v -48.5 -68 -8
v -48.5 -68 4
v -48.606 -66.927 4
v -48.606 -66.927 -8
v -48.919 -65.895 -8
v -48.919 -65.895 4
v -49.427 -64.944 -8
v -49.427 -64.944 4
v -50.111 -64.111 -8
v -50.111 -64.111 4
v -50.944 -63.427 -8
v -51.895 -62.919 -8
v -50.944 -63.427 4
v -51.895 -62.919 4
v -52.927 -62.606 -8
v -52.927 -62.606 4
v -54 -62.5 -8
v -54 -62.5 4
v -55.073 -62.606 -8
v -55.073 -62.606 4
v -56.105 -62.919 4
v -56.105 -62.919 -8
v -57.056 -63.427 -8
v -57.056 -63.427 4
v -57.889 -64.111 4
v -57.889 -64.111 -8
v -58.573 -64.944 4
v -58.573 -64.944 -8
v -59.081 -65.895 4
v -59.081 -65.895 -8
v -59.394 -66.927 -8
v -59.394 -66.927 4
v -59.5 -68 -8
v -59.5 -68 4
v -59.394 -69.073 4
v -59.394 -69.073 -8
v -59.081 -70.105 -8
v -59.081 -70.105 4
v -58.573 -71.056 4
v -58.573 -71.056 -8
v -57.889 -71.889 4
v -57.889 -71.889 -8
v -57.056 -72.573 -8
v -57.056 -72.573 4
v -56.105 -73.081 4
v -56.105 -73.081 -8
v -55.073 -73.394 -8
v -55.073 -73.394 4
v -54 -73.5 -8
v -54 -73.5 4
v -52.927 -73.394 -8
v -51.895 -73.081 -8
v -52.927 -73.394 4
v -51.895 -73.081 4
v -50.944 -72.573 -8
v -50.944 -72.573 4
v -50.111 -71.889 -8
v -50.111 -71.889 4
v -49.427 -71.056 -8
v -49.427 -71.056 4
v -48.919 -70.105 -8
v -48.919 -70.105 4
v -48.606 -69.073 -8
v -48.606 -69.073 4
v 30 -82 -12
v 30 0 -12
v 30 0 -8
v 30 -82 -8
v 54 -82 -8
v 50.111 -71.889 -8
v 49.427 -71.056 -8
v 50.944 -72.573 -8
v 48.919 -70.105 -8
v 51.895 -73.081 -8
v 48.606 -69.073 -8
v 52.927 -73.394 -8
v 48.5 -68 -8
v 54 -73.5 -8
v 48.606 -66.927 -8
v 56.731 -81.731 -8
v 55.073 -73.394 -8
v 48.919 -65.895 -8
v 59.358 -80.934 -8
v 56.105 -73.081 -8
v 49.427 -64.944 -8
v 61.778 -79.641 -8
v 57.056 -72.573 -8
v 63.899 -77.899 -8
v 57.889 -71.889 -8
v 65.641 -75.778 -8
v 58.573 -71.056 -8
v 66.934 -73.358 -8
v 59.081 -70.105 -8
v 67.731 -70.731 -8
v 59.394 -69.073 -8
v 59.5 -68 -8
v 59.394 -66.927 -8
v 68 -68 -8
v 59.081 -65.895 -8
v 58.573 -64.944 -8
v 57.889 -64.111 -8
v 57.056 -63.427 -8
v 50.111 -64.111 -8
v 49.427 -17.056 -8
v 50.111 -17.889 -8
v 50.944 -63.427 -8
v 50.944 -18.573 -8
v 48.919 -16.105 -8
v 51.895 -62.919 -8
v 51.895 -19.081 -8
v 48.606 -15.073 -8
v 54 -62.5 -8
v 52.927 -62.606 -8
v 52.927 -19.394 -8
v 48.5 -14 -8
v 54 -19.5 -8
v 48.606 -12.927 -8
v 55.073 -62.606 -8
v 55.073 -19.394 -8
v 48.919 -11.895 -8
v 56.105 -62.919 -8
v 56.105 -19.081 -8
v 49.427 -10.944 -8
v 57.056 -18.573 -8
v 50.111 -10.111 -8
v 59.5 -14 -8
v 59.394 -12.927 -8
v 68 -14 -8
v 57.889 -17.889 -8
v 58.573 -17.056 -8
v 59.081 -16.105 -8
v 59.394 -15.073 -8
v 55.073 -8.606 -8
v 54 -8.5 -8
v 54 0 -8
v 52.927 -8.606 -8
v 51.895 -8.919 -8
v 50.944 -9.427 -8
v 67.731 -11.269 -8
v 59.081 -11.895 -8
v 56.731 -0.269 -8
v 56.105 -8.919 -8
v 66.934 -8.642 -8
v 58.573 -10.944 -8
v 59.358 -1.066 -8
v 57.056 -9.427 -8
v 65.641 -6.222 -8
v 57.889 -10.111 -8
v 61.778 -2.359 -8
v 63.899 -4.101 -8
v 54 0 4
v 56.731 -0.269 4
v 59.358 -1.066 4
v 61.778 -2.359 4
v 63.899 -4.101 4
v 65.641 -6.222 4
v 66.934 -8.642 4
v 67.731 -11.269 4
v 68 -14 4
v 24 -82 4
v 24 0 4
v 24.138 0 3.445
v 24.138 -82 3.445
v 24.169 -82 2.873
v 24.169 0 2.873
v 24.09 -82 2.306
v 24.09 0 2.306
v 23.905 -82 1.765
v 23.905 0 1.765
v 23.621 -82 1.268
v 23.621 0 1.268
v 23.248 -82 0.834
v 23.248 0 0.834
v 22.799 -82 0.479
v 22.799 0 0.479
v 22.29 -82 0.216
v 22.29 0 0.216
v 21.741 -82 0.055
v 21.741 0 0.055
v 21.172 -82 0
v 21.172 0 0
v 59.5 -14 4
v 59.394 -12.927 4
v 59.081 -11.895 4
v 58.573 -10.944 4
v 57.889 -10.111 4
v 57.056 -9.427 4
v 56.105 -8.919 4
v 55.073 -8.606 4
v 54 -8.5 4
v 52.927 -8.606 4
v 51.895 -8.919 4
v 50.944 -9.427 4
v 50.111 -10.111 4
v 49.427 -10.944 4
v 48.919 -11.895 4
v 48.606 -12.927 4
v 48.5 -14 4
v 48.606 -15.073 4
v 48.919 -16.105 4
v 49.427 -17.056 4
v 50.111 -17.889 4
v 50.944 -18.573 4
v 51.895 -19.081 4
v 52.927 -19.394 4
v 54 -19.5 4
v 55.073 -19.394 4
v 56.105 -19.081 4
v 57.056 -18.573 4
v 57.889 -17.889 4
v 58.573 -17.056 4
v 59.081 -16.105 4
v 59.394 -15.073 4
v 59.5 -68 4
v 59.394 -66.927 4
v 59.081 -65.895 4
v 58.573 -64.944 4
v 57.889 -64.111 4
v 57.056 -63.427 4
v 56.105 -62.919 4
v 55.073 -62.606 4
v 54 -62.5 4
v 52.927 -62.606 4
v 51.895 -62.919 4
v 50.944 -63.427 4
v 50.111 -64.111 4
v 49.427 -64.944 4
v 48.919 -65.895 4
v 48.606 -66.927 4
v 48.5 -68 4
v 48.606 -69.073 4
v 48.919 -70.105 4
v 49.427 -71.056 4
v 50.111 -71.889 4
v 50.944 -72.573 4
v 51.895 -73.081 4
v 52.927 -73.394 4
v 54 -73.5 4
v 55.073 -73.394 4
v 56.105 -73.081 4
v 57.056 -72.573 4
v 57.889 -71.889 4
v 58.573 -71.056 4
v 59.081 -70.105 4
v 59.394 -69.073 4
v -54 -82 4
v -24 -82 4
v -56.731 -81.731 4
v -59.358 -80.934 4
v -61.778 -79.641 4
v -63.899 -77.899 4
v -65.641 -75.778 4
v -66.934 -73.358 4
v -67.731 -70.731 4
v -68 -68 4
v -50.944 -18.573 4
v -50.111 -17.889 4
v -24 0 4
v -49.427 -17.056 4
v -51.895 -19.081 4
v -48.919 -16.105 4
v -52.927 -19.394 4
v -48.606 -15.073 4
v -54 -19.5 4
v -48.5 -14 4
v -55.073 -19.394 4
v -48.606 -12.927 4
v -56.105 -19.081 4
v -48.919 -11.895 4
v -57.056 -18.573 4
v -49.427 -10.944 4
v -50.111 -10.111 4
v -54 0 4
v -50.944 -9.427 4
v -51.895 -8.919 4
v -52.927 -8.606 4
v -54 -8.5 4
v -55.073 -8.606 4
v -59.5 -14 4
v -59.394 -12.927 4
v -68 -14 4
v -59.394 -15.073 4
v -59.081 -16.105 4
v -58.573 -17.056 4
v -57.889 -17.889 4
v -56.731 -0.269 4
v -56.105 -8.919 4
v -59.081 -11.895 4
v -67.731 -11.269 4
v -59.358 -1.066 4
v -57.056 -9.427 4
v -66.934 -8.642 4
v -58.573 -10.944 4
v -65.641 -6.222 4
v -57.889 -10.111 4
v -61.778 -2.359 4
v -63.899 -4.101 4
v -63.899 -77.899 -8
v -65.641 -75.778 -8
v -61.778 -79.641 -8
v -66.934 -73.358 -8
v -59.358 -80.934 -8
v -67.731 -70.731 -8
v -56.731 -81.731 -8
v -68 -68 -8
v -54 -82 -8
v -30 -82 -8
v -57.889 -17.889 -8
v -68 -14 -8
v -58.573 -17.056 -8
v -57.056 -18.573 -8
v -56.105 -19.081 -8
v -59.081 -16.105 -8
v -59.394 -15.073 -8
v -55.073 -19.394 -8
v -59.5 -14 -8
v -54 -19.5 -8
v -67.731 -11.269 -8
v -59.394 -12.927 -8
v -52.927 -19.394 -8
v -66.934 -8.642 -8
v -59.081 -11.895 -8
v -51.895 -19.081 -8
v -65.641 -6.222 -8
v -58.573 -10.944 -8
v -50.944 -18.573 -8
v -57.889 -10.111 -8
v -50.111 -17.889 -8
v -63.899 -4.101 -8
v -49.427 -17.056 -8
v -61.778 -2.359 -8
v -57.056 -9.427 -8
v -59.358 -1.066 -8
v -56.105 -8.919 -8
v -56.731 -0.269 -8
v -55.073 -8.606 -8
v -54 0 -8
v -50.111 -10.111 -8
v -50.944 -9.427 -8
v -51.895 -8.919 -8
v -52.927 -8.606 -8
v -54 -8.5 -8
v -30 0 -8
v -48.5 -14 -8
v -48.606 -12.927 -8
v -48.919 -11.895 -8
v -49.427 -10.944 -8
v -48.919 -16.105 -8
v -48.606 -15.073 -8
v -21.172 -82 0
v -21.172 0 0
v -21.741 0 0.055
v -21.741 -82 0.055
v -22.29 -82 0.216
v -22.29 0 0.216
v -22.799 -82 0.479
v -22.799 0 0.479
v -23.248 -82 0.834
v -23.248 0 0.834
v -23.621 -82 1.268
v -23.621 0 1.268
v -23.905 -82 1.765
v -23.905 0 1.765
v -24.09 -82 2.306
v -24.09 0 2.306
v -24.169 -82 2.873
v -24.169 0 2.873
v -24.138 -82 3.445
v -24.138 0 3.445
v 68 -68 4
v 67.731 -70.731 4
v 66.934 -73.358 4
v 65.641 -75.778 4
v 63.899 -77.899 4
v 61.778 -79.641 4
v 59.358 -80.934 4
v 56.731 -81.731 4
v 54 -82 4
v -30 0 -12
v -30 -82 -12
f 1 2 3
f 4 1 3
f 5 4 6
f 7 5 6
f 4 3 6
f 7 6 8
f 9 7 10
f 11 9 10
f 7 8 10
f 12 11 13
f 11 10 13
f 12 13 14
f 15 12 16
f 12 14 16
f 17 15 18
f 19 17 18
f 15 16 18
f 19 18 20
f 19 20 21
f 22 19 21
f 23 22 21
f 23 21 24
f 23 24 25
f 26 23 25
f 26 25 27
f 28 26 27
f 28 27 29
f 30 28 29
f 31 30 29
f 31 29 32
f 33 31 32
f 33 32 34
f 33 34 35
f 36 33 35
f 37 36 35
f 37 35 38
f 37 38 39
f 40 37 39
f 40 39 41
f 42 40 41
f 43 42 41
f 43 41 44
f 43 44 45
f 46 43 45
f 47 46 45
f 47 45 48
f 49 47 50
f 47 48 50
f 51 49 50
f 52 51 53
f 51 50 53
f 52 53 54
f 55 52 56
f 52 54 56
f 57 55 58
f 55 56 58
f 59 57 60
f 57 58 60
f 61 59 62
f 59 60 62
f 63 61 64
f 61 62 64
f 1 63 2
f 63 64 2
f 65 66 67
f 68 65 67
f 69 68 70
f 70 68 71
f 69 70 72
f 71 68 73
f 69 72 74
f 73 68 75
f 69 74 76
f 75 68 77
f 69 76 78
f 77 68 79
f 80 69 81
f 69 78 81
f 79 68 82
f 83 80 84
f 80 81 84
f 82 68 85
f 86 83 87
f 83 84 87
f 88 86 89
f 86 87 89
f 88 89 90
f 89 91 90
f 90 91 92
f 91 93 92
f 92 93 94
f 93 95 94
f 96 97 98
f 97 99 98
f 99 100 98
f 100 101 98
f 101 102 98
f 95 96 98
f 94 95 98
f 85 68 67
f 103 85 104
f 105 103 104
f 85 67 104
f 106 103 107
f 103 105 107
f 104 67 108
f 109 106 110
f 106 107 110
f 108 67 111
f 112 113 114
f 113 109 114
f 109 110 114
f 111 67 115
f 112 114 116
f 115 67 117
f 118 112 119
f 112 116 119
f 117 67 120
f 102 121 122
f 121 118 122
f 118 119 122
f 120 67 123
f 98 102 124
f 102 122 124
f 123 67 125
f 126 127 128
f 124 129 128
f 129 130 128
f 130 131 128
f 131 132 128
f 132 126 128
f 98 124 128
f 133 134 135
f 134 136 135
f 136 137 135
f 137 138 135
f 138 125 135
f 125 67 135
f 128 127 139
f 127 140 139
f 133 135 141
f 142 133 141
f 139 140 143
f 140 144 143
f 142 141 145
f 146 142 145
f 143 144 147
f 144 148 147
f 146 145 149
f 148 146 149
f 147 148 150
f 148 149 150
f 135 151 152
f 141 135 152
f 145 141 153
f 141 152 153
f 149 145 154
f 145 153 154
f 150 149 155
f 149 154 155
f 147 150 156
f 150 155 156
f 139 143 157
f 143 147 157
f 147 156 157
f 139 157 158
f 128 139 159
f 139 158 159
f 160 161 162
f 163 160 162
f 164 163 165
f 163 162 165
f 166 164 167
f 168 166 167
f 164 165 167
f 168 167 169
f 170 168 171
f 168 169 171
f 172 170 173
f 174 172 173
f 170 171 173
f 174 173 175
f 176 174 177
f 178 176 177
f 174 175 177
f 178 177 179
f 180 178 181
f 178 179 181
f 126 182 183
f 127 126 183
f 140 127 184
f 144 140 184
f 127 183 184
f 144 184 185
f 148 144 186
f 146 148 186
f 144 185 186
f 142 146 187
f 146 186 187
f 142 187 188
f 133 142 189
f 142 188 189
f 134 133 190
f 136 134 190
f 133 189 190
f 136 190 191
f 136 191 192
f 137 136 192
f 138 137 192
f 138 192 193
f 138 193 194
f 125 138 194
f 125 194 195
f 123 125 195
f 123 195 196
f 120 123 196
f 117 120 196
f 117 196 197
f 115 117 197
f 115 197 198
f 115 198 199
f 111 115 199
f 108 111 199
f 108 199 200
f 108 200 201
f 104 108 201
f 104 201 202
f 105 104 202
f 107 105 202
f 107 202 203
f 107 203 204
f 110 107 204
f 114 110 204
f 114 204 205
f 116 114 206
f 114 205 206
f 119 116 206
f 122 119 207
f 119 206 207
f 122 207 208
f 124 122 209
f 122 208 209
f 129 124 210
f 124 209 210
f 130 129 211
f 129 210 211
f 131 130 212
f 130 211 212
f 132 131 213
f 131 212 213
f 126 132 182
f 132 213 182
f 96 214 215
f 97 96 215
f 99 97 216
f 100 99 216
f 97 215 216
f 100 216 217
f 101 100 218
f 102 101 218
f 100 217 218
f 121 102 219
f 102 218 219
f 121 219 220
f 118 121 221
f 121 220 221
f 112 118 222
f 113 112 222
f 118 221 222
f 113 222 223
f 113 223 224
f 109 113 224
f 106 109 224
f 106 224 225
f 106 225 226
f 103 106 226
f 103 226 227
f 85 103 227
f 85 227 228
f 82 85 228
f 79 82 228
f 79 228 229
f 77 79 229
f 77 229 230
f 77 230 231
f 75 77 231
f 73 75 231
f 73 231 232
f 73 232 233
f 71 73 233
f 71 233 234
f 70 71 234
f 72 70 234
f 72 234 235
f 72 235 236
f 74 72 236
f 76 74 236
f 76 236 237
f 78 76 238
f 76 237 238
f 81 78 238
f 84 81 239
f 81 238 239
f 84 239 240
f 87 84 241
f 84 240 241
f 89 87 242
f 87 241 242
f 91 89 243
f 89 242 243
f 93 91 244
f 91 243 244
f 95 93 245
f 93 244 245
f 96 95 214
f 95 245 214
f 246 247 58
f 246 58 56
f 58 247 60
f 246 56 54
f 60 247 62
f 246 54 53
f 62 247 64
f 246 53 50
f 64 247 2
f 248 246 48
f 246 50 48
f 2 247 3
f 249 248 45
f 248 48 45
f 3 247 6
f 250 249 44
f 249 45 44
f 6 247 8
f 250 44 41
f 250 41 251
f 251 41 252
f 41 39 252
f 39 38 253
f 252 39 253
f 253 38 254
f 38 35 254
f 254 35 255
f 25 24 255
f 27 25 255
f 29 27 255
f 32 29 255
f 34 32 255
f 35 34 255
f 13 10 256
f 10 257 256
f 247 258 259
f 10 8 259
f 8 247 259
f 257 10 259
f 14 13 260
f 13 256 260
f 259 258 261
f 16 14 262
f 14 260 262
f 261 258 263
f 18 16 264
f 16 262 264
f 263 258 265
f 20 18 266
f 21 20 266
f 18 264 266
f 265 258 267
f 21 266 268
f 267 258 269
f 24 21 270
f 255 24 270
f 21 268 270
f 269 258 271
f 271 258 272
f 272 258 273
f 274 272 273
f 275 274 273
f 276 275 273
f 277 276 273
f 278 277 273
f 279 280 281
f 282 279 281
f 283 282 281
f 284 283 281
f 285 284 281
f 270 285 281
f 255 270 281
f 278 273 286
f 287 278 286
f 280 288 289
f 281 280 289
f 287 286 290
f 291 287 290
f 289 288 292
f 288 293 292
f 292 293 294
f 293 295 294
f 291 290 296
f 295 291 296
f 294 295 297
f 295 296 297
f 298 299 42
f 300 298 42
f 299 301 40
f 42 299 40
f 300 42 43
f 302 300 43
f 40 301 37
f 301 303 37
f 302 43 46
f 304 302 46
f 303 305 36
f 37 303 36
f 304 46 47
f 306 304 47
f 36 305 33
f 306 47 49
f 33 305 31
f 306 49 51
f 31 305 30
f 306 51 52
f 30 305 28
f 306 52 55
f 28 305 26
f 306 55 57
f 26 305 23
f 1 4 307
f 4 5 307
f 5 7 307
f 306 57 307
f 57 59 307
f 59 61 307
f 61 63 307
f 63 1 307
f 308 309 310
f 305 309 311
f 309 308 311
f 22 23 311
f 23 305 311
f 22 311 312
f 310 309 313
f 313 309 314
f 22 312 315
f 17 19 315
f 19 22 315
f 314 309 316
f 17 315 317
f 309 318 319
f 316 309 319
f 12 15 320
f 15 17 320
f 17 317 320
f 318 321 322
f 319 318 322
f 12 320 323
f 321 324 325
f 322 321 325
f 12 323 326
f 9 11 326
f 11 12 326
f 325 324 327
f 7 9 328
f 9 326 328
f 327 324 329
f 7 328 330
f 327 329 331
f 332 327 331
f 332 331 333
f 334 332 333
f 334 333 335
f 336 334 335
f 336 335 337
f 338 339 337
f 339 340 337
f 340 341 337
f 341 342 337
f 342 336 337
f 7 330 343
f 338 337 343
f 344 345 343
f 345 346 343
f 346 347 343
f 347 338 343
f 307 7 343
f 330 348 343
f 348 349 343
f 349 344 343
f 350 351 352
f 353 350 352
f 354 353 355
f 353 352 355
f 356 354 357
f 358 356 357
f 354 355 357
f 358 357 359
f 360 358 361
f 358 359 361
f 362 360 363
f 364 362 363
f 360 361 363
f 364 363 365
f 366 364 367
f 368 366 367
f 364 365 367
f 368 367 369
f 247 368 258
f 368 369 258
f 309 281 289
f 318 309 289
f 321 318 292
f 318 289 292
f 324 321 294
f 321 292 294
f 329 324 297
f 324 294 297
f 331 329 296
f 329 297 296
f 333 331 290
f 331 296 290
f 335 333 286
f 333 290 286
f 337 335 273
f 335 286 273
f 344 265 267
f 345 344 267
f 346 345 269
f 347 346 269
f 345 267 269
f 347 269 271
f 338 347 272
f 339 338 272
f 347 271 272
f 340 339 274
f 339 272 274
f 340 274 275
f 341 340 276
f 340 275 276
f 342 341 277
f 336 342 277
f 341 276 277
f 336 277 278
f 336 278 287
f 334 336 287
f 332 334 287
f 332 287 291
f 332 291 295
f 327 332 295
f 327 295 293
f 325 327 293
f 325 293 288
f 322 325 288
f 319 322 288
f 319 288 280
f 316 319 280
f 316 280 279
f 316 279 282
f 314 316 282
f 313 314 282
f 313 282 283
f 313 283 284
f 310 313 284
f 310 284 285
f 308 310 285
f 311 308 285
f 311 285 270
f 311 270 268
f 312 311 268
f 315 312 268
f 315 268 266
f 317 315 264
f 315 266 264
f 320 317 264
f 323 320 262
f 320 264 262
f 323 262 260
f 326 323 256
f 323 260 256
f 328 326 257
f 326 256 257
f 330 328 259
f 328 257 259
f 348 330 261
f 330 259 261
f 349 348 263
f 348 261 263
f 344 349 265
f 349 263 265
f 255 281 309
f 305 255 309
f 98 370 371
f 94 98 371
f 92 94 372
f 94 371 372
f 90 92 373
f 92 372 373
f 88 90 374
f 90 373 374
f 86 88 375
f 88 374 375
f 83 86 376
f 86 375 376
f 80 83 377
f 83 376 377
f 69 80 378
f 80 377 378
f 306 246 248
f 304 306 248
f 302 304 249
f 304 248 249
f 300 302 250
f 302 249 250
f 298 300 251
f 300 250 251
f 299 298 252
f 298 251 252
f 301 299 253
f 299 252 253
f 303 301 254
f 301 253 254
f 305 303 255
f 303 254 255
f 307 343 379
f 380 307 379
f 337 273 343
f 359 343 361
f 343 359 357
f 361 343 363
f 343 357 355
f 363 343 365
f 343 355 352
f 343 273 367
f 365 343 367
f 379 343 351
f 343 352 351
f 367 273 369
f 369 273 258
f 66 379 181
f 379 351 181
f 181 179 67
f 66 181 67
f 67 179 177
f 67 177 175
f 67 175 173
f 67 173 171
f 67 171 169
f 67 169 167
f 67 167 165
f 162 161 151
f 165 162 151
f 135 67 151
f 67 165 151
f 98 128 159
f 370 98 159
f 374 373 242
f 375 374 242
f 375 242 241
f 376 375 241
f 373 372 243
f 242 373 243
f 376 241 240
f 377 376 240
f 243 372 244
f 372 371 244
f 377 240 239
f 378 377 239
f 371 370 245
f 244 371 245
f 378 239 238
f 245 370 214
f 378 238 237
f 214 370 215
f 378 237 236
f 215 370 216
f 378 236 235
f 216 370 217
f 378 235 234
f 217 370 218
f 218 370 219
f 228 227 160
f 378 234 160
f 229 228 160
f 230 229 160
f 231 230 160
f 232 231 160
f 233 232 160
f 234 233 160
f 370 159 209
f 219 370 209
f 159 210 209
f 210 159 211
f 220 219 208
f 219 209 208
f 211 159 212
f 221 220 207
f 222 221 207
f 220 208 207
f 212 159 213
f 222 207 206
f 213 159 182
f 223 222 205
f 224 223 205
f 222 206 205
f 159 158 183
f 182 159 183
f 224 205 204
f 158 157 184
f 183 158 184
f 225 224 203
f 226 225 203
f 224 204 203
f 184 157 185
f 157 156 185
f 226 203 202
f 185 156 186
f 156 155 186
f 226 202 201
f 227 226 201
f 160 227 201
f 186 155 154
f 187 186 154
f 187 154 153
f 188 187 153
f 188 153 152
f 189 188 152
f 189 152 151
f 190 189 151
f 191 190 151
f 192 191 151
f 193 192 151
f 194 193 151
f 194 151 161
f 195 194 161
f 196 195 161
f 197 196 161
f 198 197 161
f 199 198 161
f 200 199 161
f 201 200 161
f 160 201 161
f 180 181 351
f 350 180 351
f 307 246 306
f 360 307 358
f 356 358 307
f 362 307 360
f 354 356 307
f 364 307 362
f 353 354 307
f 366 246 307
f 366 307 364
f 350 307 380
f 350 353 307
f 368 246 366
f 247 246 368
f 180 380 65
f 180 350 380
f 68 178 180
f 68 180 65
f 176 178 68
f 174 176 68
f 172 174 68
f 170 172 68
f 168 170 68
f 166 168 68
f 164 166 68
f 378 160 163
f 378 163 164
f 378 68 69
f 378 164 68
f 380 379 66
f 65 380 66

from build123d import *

# Parameters (mm, degrees)
F1_DEPTH = 82
F3_DEPTH = 25
F4_R     = 5.5
F5_DEPTH = 25


with BuildPart() as f1:
    # F0 (on Front) → F1 (new body)
    with BuildSketch(Plane.XZ):
        with BuildLine():
            Line((21.171573, 0), (0, 0))
            Line((0, 0), (-21.171573, 0))
            ThreePointArc((-21.171573, 0), (-23.621063, 1.267949), (-24, 4))
            Line((-24, 4), (-68, 4))
            Line((-68, 4), (-68, -8))
            Line((-68, -8), (-30, -8))
            Line((-30, -8), (-30, -12))
            Line((-30, -12), (0, -12))
            Line((0, -12), (30, -12))
            Line((30, -12), (30, -8))
            Line((30, -8), (68, -8))
            Line((68, -8), (68, 4))
            Line((68, 4), (24, 4))
            ThreePointArc((24, 4), (23.621063, 1.267949), (21.171573, 0))
        make_face()
    extrude(amount=F1_DEPTH)

    # F2 (on face) → F3 (cut)
    with BuildSketch(Plane.XY.offset(4)):
        with BuildLine():
            ThreePointArc((-68, -14), (-63.899495, -4.100505), (-54, 0))
            Line((-54, 0), (-68, 0))
            Line((-68, 0), (-68, -14))
        make_face()
        with BuildLine():
            Line((-68, -82), (-54, -82))
            ThreePointArc((-54, -82), (-63.899495, -77.899495), (-68, -68))
            Line((-68, -68), (-68, -82))
        make_face()
        with BuildLine():
            Line((68, 0), (54, 0))
            ThreePointArc((54, 0), (63.899495, -4.100505), (68, -14))
            Line((68, -14), (68, 0))
        make_face()
        with BuildLine():
            ThreePointArc((68, -68), (63.899495, -77.899495), (54, -82))
            Line((54, -82), (68, -82))
            Line((68, -82), (68, -68))
        make_face()
    extrude(amount=-F3_DEPTH, mode=Mode.SUBTRACT)

    # F4 (on face) → F5 (cut)
    with BuildSketch(Plane.XY.offset(4)):
        with Locations((-54, -14)):
            Circle(F4_R)
        with Locations((-54, -68)):
            Circle(F4_R)
        with Locations((54, -14)):
            Circle(F4_R)
        with Locations((54, -68)):
            Circle(F4_R)
    extrude(amount=-F5_DEPTH, mode=Mode.SUBTRACT)


solid = f1.part
